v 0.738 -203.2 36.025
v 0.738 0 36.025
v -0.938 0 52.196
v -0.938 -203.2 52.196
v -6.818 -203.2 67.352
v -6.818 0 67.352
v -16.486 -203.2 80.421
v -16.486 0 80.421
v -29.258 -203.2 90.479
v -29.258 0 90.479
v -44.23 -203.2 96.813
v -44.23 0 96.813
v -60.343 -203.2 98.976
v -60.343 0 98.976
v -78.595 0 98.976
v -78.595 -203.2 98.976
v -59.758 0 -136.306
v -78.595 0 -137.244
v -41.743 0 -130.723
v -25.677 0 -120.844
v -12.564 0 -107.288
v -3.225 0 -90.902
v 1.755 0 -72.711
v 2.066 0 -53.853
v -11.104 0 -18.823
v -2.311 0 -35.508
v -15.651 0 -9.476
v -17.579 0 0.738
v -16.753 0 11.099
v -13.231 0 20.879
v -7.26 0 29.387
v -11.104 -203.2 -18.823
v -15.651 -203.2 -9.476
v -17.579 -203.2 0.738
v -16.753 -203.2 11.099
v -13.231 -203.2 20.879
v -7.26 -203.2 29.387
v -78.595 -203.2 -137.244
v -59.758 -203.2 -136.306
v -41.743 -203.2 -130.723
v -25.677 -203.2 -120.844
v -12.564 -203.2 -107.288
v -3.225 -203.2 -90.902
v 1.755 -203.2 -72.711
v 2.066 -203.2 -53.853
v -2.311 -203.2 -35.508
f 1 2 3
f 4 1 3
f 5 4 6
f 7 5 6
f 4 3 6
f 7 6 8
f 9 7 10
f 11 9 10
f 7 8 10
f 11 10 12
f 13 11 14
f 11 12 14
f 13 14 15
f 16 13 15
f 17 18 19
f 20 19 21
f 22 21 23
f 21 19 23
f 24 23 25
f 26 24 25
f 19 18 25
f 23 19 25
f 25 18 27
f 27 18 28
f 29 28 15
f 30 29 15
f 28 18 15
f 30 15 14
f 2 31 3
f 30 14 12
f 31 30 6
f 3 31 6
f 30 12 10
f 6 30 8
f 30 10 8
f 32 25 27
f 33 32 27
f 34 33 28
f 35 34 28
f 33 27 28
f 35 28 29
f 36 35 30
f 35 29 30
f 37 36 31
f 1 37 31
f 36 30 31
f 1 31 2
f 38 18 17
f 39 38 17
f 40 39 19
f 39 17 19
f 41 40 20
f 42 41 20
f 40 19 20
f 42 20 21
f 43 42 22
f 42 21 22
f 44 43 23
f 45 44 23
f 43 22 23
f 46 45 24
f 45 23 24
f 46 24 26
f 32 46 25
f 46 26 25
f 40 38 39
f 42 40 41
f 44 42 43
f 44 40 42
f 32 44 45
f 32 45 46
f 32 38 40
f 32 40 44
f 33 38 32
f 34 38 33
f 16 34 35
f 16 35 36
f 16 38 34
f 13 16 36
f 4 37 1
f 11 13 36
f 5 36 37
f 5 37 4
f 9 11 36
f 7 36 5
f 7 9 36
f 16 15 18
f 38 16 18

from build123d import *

# Parameters (mm, degrees)
F1_DEPTH = 203.2


with BuildPart() as f1:
    # F0 (on Front) → F1 (new body)
    with BuildSketch(Plane.XZ):
        with BuildLine():
            Line((-60.342863, 98.975755), (-78.595482, 98.975755))
            Line((-78.595482, 98.975755), (-78.595482, -137.244245))
            ThreePointArc((-78.595482, -137.244245), (-7.380595, -99.388032), (-11.104383, -18.822614))
            ThreePointArc((-11.104383, -18.822614), (-16.753261, 11.099402), (0.737776, 36.025302))
            ThreePointArc((0.737776, 36.025302), (-16.486267, 80.421272), (-60.342863, 98.975755))
        make_face()
    extrude(amount=F1_DEPTH)


solid = f1.part
